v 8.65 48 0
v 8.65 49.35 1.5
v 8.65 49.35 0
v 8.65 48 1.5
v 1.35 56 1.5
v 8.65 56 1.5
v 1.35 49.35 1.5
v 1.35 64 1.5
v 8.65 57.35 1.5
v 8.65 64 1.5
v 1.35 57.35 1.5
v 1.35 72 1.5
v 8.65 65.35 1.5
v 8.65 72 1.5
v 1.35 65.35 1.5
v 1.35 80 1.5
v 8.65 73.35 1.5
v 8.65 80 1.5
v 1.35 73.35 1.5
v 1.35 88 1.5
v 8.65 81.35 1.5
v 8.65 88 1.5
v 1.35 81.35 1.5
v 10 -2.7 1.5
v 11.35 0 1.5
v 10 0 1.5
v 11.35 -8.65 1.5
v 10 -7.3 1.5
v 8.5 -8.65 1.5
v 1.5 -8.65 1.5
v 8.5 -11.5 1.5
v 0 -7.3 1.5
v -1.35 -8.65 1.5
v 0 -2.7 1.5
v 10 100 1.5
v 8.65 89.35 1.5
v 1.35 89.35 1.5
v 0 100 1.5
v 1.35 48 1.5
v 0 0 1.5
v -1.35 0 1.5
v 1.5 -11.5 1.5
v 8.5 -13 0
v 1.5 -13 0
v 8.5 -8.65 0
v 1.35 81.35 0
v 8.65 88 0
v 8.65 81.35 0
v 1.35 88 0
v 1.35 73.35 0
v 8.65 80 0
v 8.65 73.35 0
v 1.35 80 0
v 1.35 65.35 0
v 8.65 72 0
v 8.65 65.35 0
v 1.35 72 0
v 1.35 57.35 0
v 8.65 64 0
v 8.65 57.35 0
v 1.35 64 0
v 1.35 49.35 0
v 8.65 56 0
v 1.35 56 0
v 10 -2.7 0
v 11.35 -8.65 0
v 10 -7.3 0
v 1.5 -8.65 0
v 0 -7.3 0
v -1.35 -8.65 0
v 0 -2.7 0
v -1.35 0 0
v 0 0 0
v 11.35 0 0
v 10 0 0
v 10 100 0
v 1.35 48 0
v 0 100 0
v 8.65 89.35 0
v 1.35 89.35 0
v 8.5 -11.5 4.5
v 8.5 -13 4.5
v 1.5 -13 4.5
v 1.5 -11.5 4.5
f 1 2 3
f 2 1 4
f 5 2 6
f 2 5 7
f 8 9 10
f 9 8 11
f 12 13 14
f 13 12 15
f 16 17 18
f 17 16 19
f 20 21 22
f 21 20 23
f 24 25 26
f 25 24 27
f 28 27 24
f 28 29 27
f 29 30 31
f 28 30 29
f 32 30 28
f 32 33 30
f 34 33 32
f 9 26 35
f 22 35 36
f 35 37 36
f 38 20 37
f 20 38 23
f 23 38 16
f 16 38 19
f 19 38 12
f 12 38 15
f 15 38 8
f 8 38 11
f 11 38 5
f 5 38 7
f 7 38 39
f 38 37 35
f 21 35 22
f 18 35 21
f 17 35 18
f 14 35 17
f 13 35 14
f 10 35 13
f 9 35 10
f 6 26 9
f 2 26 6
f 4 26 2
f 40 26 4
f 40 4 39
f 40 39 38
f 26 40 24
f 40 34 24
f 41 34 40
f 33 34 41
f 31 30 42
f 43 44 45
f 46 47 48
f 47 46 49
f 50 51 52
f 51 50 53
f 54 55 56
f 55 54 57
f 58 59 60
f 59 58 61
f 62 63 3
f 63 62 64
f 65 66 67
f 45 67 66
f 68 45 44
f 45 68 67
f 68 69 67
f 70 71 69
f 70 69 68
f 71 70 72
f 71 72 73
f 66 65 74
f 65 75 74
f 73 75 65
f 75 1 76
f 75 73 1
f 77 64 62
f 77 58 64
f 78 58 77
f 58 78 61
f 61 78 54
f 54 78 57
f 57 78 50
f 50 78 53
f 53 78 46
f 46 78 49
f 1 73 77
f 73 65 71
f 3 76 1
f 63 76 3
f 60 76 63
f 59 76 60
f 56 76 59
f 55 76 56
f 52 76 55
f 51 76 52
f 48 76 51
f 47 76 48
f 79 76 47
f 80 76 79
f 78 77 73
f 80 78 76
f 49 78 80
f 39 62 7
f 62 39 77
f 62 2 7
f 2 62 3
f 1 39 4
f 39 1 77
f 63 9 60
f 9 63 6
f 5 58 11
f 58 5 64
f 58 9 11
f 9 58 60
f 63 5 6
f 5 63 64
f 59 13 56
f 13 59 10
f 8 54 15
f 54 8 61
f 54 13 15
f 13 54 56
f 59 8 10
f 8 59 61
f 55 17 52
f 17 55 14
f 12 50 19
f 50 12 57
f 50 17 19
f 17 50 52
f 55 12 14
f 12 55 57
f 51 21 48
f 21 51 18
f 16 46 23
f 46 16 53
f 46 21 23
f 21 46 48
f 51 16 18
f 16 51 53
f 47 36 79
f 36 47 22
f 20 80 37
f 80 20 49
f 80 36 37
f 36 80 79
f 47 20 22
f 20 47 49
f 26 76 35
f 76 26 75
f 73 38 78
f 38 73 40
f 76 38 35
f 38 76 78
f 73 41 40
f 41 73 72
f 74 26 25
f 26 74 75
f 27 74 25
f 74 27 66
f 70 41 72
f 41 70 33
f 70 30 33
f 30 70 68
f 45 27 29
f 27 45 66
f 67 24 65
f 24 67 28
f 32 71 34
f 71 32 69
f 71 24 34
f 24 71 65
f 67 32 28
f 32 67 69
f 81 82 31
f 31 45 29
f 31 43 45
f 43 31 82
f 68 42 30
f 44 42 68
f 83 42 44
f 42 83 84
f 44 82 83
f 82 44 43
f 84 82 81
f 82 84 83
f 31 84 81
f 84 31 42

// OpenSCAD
length=100;
w=10;
d=1.5;
// holes
h_start=48;
h_space=8;
h_end=90;
border=d*0.9;
// Band
difference(){
	cube(size=[w,length,d]);
	for (hole=[h_start:h_space:h_end]) {
		translate([border, hole, 0]) {
			cube(size=[w-(2*border),border,d]);
		}
	}
}
// Endstueck
difference() {
	translate([-border,-w+border,0]) {
		cube(size=[w+(2*border),w-border,d]);
	}
	translate([0,-w+2*border,0]) {
		cube(size=[w,w-4*border,d]);
	}
}
// Nippel
translate([d,-w-(2*d),0]){
cube(size=[w-2*d,3*d,d]);
cube(size=[w-2*d,d,3*d]);
}
